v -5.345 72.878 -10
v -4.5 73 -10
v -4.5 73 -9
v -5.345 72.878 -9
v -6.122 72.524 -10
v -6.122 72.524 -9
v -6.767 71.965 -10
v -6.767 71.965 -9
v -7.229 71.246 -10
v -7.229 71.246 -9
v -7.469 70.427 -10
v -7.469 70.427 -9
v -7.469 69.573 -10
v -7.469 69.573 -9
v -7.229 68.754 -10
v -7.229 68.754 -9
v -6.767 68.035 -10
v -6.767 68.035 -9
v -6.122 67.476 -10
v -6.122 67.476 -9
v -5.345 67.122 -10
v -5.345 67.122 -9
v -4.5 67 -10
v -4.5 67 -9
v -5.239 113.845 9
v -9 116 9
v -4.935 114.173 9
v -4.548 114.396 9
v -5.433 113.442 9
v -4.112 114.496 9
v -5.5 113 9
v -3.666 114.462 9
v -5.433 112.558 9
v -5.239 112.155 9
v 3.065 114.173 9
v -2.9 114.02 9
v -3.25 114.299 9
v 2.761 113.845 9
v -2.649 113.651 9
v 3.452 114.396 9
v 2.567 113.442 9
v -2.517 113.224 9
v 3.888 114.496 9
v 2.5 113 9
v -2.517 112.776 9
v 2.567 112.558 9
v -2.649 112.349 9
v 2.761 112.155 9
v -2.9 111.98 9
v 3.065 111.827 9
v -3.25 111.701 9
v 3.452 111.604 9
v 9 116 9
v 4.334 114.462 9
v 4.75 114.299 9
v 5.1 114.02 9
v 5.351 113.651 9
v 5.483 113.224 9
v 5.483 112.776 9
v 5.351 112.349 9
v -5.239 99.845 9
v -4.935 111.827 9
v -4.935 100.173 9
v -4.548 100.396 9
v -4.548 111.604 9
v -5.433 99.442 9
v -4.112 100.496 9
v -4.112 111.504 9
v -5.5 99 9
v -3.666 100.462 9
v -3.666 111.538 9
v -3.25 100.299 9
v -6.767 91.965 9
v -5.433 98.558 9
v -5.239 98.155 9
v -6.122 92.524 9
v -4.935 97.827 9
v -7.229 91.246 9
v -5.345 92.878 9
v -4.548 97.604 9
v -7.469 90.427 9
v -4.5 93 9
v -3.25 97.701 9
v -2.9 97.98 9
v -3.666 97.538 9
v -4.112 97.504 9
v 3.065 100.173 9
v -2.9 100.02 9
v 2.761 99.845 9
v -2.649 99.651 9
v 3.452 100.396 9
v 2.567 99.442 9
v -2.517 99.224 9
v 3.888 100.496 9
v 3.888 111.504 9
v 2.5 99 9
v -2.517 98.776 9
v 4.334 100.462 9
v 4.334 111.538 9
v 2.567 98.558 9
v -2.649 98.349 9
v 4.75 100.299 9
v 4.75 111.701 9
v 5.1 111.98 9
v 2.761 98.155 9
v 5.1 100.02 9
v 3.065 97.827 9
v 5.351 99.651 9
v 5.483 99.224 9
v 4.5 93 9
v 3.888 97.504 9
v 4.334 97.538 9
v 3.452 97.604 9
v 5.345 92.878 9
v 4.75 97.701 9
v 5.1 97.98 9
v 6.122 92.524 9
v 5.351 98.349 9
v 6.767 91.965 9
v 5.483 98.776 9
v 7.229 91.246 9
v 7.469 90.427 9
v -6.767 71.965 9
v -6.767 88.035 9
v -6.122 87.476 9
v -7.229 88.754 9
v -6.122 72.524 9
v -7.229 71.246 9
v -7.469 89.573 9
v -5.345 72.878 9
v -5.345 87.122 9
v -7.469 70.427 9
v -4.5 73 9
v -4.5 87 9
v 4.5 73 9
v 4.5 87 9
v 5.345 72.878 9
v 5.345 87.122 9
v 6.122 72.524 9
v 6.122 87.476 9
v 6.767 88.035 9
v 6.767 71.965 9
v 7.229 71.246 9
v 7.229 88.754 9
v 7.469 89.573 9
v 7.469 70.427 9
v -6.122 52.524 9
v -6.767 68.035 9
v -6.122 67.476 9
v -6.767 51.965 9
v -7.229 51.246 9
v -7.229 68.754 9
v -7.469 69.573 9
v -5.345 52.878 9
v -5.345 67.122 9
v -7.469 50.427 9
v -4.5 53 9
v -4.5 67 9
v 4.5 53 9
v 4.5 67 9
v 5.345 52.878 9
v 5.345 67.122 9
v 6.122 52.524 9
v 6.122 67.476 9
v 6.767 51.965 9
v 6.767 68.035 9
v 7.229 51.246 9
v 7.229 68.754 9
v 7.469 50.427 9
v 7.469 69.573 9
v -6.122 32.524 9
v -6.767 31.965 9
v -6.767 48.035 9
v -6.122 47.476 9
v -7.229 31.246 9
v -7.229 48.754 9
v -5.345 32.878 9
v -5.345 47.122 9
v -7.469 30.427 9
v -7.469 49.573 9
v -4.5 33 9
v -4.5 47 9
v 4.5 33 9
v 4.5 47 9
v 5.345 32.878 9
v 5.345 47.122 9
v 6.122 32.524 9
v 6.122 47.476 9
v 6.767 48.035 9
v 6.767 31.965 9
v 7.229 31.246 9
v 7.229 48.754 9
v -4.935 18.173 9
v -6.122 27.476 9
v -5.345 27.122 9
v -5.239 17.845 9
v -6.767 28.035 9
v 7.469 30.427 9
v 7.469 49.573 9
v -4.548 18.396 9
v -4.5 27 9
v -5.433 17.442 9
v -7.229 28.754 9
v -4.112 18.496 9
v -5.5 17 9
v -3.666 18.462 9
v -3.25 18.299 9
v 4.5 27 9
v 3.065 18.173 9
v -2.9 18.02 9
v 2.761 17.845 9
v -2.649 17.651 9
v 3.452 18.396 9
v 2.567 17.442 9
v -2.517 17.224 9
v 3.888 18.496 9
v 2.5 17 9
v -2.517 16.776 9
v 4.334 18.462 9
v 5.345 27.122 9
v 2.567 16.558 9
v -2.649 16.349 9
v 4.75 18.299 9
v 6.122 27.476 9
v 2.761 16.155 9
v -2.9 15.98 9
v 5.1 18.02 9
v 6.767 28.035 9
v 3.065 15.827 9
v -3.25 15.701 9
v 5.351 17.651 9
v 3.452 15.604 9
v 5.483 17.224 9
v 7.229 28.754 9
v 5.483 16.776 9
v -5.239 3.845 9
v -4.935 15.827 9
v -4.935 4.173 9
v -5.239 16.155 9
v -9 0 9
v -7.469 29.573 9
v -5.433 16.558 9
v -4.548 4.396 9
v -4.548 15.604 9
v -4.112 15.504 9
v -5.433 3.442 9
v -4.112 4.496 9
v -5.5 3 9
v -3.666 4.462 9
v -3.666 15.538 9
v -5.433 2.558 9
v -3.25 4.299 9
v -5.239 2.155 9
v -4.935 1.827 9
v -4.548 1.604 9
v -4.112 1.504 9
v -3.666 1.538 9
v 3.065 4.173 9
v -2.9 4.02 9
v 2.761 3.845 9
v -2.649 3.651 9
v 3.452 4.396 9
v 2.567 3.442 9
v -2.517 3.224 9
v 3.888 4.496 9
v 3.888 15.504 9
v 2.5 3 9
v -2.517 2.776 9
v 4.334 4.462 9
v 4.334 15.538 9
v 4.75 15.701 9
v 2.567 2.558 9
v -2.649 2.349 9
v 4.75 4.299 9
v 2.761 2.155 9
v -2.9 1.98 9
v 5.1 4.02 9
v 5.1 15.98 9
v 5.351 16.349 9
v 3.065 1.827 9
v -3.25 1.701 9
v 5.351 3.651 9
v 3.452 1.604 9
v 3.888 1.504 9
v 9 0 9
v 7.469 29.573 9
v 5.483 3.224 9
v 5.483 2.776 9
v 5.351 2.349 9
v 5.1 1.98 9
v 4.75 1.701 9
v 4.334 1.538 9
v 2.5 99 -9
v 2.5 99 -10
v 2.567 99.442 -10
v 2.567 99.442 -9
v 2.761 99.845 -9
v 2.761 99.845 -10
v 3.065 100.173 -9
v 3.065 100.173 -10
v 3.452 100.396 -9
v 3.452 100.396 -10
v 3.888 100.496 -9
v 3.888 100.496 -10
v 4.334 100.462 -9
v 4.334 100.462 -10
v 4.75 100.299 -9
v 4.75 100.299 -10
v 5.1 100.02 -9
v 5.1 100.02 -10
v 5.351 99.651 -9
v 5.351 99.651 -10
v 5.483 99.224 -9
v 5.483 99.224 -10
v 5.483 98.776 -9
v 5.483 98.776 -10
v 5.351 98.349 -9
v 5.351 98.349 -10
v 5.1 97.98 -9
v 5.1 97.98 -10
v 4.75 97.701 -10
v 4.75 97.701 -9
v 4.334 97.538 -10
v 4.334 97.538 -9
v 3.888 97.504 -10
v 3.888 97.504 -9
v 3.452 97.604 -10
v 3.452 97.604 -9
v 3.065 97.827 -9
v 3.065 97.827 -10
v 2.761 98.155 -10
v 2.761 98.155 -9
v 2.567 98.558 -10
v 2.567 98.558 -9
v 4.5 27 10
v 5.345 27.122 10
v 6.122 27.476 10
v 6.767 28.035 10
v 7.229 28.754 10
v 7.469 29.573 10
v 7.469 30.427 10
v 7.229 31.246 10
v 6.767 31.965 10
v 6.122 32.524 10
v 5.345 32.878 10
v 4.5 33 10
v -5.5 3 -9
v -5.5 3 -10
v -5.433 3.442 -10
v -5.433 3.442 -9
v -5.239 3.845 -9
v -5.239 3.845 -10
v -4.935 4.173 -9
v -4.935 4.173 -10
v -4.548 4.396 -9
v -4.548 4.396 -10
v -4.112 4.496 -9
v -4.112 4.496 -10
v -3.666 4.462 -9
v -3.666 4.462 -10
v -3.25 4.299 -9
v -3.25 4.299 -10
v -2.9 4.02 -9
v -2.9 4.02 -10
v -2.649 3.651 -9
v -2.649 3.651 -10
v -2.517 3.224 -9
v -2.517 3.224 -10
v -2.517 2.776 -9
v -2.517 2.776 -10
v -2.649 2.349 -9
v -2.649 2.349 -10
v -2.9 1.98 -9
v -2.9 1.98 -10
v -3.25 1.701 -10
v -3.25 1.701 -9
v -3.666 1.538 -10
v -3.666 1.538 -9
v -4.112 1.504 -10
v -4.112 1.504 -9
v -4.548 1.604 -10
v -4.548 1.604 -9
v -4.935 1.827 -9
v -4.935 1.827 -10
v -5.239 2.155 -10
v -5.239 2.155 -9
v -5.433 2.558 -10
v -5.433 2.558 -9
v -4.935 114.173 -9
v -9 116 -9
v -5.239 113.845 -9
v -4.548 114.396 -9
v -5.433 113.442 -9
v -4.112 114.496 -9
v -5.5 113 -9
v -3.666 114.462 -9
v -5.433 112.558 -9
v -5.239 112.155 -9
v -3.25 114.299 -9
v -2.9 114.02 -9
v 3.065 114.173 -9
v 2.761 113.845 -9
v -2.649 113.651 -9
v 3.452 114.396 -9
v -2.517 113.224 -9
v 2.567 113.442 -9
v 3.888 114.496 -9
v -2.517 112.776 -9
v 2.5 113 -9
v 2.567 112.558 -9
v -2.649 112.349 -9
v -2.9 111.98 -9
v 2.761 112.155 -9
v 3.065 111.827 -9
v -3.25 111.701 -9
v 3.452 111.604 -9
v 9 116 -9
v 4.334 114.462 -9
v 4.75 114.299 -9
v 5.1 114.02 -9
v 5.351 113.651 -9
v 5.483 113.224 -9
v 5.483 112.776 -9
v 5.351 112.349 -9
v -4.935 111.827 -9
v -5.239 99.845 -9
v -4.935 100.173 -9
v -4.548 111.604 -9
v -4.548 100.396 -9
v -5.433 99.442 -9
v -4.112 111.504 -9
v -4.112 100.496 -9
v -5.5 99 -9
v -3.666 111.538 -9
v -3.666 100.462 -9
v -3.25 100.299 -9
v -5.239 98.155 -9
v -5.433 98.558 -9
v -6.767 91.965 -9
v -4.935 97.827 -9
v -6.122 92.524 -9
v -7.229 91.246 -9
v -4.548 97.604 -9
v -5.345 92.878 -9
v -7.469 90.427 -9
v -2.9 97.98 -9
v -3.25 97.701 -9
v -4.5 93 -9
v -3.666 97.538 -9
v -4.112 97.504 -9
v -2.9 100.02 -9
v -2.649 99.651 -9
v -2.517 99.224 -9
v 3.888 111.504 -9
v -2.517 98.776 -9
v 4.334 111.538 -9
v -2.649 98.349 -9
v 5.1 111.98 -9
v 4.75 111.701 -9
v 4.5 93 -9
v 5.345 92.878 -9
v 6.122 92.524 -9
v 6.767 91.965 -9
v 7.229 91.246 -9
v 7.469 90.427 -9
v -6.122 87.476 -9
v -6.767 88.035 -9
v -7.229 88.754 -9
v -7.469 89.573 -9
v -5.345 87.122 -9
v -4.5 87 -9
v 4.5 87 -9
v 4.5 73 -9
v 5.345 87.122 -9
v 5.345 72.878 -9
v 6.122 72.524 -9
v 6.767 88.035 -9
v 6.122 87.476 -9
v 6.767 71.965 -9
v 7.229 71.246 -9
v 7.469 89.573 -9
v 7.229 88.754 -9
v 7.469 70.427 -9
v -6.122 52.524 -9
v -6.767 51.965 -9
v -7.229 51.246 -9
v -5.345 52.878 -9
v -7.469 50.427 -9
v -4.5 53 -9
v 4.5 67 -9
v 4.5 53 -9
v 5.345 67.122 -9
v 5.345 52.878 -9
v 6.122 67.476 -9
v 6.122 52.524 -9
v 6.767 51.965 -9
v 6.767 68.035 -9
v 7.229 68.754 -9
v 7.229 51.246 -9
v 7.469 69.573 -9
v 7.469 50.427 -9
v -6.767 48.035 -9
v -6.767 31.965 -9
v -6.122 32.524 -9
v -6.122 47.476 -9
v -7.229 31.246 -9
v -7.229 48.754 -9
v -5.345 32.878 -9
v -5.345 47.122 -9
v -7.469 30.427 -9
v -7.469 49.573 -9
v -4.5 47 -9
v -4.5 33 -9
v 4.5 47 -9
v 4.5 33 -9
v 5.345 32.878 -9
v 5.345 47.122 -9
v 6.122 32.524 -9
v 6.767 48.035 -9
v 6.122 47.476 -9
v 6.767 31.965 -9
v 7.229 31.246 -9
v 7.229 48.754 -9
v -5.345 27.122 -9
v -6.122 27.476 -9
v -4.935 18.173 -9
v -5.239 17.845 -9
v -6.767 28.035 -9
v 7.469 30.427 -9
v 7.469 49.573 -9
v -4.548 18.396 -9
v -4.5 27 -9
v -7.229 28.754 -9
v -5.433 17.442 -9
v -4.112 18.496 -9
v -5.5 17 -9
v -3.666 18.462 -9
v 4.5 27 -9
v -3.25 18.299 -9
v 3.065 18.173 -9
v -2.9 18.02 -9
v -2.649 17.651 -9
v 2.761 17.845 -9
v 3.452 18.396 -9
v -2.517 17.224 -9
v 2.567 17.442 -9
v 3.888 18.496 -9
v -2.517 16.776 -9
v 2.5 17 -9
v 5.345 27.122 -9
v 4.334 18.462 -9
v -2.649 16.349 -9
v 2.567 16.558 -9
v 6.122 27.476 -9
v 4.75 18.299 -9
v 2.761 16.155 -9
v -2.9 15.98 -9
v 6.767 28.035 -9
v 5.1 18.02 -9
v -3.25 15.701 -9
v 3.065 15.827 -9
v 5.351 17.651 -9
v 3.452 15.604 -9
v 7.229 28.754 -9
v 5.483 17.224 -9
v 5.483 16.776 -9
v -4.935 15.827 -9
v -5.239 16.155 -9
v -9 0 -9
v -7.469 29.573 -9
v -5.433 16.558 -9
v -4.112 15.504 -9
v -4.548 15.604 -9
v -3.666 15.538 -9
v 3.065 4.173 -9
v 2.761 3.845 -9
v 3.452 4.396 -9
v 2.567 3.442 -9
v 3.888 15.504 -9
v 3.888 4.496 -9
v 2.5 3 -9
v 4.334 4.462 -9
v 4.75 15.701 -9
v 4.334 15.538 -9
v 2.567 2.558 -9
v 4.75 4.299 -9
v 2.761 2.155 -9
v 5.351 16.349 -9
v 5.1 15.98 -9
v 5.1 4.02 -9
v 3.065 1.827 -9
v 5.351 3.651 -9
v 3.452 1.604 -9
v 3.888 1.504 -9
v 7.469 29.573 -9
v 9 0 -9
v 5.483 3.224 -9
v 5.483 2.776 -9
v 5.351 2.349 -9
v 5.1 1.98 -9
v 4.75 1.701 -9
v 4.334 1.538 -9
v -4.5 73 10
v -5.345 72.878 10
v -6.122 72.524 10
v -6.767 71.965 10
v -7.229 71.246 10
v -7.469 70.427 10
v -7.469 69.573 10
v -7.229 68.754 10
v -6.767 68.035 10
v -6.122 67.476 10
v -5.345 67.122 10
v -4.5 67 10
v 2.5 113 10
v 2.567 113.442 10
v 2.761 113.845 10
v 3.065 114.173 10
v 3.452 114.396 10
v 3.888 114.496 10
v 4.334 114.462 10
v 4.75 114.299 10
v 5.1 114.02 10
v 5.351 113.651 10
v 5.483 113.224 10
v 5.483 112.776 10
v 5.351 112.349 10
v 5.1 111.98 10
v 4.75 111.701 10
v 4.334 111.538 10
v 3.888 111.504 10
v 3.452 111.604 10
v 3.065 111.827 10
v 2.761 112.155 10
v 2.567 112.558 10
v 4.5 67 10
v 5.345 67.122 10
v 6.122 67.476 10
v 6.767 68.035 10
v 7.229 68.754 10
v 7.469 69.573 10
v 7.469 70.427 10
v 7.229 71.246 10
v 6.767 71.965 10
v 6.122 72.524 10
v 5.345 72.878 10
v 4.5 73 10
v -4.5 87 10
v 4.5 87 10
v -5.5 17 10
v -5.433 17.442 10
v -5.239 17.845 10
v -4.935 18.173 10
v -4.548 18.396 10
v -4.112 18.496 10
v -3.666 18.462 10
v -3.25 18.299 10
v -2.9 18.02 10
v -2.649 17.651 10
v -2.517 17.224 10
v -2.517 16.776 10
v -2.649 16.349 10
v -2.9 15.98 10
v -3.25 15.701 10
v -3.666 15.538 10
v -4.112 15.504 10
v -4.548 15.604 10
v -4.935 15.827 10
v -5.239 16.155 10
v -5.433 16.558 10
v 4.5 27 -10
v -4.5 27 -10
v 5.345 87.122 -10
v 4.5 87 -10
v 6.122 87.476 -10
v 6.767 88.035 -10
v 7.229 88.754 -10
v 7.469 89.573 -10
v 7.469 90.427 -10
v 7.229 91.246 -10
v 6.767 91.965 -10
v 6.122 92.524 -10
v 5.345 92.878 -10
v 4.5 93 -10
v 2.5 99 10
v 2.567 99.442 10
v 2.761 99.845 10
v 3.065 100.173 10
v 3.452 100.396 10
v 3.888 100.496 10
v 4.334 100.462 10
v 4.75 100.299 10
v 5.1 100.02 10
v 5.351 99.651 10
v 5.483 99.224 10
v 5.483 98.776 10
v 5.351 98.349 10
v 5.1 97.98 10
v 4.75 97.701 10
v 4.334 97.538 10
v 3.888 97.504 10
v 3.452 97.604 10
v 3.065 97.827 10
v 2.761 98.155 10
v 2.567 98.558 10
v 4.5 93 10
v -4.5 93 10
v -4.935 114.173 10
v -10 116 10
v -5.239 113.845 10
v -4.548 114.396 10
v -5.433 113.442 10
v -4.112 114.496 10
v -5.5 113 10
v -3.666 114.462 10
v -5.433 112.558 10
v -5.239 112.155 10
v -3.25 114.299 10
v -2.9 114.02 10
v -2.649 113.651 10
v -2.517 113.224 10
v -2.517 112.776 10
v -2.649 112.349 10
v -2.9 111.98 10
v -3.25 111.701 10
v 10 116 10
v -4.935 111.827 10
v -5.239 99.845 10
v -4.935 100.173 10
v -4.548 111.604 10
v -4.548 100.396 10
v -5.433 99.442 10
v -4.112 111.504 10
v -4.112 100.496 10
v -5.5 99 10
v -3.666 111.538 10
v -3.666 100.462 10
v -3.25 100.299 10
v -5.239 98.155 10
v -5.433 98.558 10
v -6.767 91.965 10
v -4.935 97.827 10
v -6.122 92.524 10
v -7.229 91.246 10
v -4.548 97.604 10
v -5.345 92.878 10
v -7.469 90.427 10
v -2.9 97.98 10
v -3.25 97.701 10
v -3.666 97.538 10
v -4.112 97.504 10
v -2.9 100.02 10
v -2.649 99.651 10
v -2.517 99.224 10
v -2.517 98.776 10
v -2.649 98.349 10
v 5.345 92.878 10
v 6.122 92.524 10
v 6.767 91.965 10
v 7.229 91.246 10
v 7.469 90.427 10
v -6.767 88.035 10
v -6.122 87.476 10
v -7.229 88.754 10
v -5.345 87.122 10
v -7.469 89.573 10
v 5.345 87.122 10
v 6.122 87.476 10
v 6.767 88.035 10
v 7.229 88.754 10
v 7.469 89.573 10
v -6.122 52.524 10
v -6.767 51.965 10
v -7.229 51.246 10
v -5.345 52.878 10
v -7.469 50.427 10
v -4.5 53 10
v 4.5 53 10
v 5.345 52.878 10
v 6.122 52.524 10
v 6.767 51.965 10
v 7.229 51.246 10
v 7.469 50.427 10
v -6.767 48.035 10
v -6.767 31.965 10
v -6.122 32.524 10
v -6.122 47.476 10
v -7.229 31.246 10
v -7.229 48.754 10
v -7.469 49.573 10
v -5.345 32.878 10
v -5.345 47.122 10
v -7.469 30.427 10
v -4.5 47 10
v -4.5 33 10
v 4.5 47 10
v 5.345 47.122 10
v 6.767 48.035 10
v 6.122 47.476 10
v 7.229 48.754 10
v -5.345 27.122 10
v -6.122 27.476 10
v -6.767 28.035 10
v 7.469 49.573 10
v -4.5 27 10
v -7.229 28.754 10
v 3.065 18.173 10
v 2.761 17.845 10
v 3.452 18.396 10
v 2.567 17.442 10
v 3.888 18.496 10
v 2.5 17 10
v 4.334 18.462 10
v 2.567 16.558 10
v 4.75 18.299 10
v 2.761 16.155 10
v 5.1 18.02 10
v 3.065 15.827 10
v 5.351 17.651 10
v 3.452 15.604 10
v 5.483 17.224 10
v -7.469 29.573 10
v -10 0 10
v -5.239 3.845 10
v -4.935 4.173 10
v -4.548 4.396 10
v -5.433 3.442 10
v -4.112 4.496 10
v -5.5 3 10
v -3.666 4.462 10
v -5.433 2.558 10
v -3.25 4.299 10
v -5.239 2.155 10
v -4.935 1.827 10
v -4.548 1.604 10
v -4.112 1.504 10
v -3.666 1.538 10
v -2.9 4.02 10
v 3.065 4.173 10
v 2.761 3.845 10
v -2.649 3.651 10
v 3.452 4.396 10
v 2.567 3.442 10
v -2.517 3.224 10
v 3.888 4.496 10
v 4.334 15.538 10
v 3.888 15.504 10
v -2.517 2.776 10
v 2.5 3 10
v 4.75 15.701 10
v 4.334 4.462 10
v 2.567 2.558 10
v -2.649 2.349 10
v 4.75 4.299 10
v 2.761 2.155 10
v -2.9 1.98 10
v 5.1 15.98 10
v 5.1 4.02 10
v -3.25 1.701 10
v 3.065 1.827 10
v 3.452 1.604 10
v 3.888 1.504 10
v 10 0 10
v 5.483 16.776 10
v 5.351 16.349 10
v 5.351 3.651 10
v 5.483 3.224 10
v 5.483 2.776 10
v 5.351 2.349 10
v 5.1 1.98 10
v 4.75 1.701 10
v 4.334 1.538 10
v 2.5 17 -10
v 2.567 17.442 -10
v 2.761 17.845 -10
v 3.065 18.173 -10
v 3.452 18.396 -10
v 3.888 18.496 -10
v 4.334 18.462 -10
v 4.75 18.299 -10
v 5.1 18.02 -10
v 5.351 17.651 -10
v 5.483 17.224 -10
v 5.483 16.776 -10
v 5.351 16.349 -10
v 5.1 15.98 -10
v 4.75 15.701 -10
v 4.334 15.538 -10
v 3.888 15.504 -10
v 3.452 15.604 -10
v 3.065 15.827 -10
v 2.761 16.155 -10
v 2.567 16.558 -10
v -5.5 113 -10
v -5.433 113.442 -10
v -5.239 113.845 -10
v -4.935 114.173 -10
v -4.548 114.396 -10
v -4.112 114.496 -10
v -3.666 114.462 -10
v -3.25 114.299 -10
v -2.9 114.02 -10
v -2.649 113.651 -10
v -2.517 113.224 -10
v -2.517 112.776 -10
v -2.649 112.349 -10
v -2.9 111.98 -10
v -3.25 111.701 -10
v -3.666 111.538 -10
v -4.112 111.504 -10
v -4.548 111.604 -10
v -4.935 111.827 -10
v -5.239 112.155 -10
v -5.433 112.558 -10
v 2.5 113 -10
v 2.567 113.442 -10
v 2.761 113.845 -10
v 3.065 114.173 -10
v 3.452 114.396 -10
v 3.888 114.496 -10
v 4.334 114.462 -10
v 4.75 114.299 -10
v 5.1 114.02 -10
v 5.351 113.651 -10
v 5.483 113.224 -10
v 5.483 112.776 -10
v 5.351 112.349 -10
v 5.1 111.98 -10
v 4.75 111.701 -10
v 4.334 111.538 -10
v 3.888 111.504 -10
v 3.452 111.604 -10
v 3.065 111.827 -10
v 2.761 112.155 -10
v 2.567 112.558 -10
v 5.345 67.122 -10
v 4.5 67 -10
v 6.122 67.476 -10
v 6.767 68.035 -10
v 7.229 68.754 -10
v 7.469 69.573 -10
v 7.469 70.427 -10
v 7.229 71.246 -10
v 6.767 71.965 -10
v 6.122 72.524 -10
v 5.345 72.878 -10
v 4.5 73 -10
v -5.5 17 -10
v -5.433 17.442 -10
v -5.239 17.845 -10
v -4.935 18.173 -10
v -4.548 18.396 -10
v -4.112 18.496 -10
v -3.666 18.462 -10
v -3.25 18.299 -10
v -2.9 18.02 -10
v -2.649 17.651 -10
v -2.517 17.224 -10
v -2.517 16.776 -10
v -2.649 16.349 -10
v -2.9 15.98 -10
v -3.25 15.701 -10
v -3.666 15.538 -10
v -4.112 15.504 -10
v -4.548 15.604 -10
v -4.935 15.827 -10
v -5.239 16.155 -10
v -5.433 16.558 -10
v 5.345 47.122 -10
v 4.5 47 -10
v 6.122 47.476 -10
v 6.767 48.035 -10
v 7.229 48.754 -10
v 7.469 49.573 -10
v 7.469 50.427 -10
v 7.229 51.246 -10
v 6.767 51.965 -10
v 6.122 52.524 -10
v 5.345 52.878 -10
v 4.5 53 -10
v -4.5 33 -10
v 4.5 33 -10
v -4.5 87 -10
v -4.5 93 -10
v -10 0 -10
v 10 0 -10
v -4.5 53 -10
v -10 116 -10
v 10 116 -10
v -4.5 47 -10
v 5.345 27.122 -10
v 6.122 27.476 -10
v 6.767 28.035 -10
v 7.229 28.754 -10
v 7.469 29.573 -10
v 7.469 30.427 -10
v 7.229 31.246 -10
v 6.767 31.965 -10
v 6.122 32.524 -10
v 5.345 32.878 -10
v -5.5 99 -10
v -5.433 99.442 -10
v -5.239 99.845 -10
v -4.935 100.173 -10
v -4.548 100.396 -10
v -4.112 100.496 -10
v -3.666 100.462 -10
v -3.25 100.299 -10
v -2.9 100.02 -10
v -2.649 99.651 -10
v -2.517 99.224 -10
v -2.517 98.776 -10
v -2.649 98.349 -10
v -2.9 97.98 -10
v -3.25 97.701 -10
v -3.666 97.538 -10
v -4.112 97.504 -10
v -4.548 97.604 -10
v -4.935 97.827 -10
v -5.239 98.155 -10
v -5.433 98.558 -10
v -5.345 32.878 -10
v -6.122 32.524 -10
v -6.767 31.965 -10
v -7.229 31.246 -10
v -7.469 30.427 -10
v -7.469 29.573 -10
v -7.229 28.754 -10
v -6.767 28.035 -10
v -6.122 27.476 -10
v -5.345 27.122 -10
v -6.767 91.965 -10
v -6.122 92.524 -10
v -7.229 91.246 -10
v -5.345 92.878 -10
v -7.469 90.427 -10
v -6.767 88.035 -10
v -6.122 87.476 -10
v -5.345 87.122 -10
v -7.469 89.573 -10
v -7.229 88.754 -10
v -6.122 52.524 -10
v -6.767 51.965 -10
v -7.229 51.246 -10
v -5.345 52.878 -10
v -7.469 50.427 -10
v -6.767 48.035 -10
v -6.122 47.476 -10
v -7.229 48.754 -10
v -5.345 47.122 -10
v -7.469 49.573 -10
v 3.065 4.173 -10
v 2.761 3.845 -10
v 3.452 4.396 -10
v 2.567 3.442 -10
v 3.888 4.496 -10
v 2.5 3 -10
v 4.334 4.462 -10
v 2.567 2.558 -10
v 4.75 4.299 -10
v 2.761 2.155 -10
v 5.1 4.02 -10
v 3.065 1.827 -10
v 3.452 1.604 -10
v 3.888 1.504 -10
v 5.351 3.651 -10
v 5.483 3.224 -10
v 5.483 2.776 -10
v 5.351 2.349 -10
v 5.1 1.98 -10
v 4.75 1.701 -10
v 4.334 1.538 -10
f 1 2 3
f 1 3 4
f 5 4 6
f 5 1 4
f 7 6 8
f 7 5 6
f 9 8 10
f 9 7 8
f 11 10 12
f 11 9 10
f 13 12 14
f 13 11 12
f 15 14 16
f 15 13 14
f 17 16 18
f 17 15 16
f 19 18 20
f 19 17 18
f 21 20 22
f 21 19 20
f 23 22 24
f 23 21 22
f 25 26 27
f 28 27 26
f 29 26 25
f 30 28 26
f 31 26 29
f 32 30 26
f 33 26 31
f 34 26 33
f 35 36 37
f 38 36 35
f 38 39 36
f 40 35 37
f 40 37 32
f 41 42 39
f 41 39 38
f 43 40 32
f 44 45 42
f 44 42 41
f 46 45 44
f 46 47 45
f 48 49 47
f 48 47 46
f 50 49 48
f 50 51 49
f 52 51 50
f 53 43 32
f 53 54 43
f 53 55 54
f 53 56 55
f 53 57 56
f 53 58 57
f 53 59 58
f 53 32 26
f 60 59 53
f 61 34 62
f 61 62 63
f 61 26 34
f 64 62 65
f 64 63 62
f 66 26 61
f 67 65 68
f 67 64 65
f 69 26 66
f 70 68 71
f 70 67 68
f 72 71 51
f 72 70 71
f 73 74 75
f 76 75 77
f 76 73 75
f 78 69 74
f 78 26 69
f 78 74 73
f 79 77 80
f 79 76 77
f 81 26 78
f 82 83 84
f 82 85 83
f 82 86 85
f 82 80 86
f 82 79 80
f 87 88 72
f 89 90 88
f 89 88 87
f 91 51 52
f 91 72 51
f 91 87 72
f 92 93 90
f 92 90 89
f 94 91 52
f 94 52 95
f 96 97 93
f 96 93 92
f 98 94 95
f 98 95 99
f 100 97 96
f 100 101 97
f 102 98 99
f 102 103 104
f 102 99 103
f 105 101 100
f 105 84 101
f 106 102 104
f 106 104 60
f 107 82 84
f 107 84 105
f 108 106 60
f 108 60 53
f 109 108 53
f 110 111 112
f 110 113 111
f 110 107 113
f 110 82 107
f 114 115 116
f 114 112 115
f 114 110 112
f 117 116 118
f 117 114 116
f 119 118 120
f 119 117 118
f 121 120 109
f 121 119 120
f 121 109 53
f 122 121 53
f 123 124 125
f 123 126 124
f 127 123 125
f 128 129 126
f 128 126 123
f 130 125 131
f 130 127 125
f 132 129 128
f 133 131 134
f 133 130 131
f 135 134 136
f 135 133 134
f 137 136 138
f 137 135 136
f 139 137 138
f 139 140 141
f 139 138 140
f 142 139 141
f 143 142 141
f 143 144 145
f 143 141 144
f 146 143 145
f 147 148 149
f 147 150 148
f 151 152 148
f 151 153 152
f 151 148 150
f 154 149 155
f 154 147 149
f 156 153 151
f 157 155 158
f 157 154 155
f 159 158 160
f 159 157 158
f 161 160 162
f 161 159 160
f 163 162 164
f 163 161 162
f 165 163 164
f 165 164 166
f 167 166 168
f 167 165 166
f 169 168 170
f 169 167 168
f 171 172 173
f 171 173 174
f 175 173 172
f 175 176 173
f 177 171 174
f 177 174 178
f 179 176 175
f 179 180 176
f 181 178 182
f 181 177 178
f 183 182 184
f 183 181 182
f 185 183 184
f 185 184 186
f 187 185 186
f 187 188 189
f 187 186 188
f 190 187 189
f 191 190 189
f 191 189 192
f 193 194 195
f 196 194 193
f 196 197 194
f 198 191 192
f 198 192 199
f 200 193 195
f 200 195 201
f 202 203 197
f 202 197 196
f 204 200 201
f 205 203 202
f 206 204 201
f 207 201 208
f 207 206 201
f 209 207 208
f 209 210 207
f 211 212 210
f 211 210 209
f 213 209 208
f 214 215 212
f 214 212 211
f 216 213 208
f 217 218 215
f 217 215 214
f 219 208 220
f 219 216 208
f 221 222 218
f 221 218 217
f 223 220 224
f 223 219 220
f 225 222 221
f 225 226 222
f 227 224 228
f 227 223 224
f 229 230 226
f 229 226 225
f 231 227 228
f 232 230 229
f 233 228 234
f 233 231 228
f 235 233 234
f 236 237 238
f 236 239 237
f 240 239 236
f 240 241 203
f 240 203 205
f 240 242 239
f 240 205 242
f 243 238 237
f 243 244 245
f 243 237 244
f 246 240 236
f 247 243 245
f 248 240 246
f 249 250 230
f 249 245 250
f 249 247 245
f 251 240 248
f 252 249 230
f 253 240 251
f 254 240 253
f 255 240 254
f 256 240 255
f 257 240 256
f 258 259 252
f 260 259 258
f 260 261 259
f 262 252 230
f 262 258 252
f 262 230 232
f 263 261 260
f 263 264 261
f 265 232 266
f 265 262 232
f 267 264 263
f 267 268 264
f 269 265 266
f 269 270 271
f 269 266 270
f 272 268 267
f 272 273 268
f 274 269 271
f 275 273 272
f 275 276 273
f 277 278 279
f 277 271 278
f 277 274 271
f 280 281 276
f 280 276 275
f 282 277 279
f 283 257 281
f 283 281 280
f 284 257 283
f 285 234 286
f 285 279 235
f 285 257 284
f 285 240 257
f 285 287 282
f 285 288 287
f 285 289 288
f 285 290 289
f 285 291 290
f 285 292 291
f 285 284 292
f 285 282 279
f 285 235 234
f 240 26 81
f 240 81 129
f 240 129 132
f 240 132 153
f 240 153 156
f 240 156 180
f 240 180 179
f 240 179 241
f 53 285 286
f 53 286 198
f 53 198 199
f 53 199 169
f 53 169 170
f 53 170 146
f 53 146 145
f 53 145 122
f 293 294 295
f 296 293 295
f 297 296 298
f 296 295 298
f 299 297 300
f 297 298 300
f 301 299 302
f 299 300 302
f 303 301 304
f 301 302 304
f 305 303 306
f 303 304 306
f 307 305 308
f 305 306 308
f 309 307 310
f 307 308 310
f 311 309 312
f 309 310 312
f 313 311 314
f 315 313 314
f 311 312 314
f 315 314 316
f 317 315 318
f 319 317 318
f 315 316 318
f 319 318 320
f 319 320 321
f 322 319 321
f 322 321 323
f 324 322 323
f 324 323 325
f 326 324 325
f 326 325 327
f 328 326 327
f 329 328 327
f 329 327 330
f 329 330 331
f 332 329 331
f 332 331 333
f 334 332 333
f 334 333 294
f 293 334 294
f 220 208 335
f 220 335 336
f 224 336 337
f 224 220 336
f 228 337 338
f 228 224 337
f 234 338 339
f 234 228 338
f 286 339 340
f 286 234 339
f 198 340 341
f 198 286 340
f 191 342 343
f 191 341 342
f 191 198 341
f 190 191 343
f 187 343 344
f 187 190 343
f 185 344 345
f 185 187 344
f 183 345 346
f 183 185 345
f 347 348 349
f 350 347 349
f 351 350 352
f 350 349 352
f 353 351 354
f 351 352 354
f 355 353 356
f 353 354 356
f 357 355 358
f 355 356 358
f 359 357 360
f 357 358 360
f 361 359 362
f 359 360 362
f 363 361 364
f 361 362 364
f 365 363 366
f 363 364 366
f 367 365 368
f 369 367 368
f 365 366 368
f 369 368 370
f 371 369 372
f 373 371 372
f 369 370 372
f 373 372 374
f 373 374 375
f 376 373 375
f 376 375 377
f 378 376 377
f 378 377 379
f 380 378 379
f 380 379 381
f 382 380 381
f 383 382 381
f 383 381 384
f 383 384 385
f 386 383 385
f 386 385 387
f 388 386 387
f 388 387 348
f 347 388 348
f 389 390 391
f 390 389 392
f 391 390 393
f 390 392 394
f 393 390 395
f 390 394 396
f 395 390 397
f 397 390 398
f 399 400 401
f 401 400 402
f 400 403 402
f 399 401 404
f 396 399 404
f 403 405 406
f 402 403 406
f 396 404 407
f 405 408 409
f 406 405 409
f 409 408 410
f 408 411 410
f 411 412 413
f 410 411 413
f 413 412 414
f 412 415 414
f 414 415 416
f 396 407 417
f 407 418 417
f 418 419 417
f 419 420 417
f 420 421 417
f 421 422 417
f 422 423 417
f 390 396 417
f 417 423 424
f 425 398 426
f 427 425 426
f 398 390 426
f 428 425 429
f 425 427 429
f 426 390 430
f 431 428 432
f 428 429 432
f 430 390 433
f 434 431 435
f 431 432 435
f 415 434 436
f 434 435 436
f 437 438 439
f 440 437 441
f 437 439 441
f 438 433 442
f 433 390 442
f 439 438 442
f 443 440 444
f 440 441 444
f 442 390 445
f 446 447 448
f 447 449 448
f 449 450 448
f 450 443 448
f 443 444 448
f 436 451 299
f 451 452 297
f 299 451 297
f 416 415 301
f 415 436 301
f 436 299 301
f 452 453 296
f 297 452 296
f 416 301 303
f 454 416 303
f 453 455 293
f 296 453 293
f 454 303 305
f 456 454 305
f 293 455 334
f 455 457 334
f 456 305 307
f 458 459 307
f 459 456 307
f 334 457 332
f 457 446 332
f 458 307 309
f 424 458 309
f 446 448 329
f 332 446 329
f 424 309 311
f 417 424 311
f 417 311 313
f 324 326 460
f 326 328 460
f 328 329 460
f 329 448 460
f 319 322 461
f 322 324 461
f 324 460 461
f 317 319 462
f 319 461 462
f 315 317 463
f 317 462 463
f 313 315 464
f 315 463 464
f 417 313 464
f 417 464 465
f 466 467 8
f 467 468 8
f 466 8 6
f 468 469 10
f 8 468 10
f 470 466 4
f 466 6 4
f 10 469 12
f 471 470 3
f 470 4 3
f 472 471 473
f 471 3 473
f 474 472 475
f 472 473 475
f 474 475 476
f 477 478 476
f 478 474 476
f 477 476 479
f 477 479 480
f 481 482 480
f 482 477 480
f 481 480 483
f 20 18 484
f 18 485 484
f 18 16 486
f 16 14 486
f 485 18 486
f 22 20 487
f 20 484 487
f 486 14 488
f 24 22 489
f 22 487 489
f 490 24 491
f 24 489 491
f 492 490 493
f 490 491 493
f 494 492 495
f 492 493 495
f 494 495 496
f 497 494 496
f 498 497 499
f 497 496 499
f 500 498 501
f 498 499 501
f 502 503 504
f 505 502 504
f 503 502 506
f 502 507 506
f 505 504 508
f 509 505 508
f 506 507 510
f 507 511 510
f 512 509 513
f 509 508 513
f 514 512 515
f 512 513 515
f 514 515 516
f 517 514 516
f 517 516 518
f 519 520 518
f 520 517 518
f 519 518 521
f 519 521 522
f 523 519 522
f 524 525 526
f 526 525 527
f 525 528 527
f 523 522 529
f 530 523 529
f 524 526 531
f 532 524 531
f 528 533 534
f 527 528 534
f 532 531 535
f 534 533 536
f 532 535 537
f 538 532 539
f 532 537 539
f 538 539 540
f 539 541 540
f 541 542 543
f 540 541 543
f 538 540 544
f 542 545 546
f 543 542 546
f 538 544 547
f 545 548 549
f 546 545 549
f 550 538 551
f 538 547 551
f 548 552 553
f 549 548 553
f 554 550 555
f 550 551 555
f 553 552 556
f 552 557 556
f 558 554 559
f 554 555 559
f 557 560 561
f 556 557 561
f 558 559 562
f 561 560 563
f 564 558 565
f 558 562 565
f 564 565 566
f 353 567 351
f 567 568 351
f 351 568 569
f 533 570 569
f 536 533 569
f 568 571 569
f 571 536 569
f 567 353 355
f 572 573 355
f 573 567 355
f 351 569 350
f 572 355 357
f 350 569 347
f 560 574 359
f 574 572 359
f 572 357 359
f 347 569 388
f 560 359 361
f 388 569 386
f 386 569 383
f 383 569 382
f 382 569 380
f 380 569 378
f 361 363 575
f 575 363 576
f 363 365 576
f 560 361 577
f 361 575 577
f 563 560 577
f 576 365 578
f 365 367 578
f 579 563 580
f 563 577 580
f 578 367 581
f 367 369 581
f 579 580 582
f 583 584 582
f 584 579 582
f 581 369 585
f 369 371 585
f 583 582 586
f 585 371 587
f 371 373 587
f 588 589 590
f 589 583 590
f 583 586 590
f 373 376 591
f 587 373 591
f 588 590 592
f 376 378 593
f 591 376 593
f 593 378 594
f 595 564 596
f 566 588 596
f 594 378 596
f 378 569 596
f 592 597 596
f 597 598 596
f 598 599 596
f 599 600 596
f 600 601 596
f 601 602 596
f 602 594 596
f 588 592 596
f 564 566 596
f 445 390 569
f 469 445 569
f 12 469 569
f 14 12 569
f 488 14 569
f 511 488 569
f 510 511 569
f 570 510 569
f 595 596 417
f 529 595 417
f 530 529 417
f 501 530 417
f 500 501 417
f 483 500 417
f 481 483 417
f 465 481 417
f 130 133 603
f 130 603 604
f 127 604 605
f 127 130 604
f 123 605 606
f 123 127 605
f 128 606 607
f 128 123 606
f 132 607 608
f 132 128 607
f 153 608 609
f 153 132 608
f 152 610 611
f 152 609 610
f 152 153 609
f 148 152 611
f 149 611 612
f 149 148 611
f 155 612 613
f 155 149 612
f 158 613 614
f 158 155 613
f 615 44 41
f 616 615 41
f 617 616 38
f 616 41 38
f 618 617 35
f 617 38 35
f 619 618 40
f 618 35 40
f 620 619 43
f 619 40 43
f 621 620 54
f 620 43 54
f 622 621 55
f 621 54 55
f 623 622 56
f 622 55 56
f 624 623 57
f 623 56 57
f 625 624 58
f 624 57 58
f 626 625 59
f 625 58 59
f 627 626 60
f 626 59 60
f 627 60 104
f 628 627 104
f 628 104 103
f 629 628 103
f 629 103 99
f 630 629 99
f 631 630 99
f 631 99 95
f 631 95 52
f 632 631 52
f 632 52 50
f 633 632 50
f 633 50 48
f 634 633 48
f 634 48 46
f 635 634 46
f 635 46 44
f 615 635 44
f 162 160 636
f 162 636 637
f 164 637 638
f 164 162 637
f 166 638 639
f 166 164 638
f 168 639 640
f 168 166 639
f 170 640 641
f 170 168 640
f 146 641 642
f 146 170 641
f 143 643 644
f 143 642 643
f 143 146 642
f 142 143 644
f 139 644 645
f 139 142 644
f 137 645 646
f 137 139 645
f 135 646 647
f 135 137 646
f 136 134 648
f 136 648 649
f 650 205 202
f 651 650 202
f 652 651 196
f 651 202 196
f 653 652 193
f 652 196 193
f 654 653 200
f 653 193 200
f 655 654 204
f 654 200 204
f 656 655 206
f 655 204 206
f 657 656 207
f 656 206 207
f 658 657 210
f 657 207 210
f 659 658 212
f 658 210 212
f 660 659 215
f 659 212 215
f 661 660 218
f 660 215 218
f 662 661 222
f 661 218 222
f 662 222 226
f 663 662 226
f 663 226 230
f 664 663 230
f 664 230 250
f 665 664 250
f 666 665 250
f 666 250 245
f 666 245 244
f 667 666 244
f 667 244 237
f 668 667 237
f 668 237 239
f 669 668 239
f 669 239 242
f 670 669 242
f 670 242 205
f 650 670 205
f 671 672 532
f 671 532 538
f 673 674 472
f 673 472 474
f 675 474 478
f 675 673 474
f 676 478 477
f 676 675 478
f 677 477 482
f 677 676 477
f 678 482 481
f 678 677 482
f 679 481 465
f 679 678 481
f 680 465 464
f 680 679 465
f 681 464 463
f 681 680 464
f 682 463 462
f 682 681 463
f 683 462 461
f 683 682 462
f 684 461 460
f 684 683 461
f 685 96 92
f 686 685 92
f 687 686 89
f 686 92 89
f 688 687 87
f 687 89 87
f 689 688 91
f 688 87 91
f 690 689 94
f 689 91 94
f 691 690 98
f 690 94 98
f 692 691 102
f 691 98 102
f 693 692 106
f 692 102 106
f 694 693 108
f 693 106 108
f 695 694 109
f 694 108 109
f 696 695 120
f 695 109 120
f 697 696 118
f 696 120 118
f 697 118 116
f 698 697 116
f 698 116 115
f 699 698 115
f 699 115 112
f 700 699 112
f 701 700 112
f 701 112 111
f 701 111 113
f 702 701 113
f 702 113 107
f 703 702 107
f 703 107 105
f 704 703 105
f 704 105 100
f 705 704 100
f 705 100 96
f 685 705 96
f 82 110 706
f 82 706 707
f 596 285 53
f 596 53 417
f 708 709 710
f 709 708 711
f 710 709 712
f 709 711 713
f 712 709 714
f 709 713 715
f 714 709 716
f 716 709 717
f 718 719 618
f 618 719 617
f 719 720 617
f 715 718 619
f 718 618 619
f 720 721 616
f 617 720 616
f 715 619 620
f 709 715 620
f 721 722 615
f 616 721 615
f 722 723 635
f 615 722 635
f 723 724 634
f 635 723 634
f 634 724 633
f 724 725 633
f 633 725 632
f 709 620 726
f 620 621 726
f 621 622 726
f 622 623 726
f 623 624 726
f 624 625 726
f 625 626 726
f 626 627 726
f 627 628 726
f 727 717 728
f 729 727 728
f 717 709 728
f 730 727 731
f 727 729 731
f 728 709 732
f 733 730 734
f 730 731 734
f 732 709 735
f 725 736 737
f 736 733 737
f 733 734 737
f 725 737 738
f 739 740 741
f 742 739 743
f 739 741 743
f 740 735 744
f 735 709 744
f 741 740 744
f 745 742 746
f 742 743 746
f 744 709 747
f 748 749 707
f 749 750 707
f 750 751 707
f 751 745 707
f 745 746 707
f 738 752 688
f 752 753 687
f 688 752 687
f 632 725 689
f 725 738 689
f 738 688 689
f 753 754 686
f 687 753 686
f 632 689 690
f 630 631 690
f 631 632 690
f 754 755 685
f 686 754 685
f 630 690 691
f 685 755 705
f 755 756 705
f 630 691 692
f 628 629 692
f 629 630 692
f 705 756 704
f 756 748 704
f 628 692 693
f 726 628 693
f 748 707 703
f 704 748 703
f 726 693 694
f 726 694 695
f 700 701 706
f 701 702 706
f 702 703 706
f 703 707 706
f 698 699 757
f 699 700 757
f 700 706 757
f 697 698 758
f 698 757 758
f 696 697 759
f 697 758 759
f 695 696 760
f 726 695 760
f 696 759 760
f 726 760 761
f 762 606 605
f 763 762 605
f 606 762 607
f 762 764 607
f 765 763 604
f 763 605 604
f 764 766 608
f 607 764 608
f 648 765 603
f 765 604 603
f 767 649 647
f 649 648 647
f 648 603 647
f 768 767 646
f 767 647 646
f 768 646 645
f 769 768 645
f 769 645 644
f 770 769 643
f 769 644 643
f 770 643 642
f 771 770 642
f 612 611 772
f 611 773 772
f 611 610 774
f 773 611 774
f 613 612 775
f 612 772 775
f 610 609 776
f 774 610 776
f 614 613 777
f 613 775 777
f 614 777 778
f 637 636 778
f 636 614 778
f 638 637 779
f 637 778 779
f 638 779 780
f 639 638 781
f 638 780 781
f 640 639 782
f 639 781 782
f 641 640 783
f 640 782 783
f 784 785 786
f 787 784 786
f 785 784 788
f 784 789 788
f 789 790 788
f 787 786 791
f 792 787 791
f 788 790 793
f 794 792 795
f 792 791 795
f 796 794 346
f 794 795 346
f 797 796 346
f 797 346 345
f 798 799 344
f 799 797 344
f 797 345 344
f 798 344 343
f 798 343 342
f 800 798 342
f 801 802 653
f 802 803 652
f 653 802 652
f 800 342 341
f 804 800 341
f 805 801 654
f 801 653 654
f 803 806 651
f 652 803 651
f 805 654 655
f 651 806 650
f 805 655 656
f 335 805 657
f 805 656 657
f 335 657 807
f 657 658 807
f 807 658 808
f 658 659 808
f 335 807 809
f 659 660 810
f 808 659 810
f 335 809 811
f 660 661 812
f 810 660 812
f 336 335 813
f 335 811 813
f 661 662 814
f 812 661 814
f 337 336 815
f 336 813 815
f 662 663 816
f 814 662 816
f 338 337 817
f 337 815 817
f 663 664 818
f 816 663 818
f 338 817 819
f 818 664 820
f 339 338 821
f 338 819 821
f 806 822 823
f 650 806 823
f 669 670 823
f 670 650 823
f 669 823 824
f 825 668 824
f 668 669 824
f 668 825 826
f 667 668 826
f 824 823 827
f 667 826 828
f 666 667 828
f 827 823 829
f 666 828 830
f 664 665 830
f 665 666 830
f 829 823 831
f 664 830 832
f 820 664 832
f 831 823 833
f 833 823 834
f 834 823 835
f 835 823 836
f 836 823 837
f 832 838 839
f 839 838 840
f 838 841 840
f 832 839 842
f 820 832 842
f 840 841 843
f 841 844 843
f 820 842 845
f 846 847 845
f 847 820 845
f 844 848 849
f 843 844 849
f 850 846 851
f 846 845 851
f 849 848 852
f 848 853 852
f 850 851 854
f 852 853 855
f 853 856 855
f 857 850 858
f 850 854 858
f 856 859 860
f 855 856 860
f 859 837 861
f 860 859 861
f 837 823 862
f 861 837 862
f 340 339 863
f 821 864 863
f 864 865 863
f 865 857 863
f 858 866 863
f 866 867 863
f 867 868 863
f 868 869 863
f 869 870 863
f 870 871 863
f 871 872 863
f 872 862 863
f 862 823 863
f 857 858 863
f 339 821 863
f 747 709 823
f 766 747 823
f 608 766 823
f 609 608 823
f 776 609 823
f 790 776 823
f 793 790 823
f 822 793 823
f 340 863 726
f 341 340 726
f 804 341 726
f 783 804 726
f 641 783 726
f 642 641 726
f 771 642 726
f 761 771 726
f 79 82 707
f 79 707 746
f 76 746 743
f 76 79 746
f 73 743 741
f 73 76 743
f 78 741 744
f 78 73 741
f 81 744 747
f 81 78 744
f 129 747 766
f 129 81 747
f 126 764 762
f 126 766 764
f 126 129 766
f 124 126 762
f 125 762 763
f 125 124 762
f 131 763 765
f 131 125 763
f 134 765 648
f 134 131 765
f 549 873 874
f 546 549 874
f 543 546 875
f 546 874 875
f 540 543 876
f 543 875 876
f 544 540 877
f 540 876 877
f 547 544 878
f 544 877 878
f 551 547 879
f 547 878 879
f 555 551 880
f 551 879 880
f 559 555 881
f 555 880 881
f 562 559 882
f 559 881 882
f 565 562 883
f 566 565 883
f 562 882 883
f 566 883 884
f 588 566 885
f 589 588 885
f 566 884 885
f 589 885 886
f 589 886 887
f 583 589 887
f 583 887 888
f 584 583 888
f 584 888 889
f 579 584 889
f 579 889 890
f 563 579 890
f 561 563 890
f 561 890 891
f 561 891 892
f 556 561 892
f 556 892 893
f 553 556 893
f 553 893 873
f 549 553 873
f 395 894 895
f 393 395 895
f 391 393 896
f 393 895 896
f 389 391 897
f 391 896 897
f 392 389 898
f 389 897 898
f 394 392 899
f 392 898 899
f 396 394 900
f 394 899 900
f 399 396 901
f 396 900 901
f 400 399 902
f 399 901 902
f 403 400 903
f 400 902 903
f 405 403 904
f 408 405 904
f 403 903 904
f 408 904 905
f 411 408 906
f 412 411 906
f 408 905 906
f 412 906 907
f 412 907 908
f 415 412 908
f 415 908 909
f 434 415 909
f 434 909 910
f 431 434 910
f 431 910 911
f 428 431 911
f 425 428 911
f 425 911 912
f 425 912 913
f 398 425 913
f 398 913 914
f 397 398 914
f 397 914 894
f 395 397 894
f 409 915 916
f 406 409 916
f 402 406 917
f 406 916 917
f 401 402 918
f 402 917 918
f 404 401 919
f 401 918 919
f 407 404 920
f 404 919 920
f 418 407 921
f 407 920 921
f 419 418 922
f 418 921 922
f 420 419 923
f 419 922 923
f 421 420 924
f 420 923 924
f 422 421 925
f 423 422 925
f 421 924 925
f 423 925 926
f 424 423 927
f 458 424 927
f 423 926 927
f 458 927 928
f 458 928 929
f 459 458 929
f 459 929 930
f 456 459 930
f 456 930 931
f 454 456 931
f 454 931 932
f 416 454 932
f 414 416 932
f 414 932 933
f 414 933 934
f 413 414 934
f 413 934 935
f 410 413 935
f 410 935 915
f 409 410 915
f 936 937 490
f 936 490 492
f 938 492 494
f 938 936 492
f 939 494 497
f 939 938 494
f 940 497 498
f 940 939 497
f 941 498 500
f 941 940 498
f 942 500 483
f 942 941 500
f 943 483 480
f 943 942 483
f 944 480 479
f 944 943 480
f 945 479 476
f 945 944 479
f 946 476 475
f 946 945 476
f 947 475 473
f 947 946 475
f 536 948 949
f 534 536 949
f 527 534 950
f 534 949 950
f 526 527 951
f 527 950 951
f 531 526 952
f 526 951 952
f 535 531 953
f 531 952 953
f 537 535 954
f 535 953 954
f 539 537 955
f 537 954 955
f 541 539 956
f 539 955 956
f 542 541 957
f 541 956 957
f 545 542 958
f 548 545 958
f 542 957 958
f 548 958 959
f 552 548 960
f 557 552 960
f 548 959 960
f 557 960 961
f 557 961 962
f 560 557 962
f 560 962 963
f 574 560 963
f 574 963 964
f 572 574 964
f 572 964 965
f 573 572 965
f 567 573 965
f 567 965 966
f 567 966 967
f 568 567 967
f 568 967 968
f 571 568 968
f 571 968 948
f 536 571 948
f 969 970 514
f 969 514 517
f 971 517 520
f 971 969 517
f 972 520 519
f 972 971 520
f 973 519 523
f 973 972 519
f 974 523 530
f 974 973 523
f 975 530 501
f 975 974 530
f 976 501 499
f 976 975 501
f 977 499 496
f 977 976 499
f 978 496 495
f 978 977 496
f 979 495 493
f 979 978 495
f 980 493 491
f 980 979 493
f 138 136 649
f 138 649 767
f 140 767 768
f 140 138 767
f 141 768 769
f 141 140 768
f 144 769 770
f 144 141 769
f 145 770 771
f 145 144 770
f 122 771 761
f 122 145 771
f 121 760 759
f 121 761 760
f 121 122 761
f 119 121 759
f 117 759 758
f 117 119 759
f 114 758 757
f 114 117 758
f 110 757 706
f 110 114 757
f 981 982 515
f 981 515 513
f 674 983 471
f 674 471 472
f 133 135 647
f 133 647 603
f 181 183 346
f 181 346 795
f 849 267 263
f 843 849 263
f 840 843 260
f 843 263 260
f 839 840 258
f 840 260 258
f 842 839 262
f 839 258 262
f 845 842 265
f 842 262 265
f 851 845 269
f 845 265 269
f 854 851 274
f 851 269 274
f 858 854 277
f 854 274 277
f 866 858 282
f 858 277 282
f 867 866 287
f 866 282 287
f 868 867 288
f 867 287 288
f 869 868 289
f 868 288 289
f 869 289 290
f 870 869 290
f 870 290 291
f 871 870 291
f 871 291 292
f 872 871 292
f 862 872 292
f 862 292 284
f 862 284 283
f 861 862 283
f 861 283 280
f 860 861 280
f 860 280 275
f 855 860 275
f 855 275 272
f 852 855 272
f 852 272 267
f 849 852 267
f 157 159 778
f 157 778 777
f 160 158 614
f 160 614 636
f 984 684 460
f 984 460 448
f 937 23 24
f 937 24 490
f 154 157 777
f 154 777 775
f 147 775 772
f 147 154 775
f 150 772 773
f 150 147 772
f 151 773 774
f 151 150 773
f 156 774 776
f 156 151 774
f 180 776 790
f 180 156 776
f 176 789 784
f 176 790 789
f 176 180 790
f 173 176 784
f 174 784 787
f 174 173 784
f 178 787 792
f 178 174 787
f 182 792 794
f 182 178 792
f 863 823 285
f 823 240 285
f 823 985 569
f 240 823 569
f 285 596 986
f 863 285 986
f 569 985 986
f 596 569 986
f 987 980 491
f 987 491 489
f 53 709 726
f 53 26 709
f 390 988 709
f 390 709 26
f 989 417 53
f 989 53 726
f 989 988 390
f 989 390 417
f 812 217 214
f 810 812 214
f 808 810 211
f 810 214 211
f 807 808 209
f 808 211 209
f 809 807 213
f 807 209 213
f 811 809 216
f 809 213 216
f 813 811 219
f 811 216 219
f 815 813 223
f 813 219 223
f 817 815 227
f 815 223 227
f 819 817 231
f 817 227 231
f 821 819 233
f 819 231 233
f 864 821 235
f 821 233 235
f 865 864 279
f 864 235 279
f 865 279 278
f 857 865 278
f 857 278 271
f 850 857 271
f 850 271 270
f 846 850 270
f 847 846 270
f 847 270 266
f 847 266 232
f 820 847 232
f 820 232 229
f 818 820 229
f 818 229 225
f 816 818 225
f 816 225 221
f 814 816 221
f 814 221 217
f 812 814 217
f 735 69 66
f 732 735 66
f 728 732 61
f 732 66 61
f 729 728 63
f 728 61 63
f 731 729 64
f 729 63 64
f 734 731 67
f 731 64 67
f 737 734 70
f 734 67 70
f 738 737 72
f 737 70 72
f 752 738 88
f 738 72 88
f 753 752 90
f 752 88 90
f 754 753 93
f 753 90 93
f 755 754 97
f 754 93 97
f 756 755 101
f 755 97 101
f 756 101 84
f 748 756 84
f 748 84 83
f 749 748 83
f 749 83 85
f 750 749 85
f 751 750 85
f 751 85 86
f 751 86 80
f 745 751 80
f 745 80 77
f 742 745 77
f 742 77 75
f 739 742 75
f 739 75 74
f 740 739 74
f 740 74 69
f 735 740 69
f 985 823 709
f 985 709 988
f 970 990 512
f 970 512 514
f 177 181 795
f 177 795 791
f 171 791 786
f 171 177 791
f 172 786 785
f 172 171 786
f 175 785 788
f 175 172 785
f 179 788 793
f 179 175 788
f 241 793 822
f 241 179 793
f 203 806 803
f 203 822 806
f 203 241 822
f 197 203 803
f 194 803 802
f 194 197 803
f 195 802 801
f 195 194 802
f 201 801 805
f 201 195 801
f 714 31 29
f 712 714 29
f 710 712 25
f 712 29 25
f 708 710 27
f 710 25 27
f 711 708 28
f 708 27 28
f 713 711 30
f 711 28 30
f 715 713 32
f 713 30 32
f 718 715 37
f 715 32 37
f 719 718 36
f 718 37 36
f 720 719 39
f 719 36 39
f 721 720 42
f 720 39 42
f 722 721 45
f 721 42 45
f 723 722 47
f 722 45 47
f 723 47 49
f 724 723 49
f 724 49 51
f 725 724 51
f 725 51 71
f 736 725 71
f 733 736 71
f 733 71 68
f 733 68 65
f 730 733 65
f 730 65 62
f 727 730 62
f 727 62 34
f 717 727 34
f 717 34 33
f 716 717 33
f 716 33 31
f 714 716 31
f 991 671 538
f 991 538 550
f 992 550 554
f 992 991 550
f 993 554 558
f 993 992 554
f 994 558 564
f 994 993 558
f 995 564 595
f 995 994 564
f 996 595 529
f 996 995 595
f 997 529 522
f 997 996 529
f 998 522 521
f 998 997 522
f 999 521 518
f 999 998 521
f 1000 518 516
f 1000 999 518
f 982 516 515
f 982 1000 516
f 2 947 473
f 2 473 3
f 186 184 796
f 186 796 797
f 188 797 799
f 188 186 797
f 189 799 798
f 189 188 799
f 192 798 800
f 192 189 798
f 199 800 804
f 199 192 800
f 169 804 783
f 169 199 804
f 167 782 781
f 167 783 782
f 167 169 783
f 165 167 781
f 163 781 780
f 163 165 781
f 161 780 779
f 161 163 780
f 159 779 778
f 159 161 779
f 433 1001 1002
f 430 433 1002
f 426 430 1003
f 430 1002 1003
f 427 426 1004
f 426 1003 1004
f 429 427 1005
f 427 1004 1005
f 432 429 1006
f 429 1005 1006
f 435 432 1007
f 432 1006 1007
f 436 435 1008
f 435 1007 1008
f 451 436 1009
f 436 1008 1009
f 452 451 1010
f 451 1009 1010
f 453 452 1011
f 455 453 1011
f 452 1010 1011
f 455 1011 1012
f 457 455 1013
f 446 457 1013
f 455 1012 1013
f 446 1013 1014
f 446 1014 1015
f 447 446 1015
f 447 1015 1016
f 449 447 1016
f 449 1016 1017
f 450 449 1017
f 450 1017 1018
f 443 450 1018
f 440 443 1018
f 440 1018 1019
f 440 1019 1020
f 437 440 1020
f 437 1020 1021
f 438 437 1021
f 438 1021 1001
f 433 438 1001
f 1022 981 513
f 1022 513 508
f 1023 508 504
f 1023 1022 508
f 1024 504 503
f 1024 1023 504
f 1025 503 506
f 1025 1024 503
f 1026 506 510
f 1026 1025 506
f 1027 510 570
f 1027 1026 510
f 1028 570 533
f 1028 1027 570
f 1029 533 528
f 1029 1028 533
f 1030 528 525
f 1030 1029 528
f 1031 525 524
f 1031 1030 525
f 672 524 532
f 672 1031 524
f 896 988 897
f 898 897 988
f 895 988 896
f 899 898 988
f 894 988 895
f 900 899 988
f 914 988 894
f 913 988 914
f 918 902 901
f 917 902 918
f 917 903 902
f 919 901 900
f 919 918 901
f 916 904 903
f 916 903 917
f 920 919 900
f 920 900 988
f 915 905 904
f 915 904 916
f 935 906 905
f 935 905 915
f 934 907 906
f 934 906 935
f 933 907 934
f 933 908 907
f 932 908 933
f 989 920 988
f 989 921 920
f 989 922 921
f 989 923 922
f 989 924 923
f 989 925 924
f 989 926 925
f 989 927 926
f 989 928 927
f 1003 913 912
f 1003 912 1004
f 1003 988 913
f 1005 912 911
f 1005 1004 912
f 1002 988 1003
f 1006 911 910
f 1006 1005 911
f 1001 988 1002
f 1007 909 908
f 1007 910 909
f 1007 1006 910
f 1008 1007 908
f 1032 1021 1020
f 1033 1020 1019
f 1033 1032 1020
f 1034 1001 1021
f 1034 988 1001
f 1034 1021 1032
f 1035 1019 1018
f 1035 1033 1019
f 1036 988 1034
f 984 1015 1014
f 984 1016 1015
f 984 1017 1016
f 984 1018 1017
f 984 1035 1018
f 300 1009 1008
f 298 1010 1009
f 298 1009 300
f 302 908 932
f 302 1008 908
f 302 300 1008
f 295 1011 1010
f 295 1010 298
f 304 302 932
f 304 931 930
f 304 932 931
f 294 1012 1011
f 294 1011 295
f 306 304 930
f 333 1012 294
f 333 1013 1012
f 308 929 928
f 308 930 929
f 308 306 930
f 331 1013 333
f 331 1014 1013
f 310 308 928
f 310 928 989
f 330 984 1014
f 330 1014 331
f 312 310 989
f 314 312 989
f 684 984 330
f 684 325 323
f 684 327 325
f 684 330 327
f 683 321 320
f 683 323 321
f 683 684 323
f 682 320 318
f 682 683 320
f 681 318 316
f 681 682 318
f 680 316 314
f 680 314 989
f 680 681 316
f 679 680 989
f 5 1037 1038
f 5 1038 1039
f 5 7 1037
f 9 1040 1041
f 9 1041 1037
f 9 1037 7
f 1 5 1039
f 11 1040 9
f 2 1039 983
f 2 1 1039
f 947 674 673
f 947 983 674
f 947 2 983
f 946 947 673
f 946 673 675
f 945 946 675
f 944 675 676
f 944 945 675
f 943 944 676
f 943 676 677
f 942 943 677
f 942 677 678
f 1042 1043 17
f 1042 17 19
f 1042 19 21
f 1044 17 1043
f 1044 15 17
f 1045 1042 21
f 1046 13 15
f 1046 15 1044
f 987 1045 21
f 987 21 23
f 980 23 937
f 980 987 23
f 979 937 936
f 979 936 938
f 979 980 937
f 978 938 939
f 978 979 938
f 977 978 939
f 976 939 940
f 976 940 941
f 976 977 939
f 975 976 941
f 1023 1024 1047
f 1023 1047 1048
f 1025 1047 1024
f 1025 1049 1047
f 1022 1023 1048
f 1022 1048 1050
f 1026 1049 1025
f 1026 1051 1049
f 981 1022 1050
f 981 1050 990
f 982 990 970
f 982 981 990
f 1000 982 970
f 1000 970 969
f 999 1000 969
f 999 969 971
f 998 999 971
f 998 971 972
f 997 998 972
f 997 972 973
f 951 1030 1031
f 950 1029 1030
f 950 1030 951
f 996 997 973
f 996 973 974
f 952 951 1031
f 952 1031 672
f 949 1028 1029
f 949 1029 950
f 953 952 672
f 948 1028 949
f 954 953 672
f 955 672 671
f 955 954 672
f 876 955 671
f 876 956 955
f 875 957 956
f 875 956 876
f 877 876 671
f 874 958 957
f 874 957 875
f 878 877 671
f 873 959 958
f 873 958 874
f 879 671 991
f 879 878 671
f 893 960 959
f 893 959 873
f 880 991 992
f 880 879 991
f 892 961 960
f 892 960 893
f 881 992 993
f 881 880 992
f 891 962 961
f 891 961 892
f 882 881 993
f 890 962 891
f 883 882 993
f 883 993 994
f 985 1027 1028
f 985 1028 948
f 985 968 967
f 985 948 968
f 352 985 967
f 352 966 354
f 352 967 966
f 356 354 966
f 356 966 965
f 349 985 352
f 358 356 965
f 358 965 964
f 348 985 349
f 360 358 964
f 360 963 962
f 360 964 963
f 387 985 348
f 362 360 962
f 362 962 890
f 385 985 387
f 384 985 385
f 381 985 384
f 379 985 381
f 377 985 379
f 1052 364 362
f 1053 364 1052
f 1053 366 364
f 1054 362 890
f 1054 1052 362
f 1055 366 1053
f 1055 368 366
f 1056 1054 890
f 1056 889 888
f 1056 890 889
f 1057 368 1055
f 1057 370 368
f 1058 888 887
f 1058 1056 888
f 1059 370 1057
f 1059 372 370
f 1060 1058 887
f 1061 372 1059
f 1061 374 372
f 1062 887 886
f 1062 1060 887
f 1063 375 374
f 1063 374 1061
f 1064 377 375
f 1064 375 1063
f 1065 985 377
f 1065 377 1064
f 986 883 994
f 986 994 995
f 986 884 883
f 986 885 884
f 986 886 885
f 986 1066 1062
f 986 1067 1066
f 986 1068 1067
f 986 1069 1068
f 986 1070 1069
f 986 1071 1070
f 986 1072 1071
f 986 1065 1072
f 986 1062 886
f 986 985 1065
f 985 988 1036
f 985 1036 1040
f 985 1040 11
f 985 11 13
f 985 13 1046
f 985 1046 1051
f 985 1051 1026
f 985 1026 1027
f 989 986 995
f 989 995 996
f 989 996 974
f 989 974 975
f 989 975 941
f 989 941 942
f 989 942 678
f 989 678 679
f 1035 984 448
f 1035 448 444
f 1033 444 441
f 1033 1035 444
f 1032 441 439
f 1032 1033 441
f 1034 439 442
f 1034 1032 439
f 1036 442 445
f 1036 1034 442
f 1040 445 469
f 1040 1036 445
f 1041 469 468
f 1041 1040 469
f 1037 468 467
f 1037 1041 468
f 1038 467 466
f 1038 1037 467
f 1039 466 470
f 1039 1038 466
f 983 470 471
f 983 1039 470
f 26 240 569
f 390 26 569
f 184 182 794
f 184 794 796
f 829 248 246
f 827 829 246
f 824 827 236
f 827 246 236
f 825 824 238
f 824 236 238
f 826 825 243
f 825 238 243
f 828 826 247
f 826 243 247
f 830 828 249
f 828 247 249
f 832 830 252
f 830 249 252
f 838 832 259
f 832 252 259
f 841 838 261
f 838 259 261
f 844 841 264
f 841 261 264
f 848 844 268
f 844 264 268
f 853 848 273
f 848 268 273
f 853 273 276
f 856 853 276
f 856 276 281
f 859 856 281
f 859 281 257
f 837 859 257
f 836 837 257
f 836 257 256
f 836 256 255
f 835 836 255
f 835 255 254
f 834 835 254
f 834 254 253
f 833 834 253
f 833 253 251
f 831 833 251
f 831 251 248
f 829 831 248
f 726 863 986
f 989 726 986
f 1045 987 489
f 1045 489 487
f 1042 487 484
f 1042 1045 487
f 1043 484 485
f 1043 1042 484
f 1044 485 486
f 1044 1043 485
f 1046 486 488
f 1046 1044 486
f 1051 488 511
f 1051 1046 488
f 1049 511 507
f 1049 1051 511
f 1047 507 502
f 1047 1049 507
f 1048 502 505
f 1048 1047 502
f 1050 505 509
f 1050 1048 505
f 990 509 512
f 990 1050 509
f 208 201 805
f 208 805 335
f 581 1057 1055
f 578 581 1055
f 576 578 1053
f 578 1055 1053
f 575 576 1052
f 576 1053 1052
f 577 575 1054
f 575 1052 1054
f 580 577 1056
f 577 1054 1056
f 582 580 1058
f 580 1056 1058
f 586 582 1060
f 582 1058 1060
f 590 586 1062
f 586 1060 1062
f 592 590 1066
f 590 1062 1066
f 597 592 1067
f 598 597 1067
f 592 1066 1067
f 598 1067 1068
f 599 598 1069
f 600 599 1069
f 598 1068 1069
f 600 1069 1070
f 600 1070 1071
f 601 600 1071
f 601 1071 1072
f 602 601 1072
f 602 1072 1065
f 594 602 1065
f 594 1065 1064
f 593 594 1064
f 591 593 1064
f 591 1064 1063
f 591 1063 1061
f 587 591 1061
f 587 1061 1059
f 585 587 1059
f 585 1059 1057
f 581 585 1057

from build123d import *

# Parameters (mm, degrees)
SKETCH_1_W             = 20
SKETCH_1_H             = 20
SKETCH_1_W_2           = 18
SKETCH_1_H_2           = 18
HS_20X20X1_1_DEPTH     = 116
CUT_EXTRUDE_4_DEPTH    = 37
PATTERN_LINEAR_1_COUNT = 4
PATTERN_LINEAR_1_PITCH = 20
SKETCH_5_R             = 1.5
CUT_EXTRUDE_5_DEPTH    = 31


with BuildPart() as part:
    # 草图1 → Hs 20X20X1(1) (new body)
    with BuildSketch(Plane(origin=(0, 0, 0), x_dir=(1, 0, 0), z_dir=(0, 1, 0))):
        Rectangle(SKETCH_1_W, SKETCH_1_H)
        Rectangle(SKETCH_1_W_2, SKETCH_1_H_2, mode=Mode.SUBTRACT)
    extrude(amount=HS_20X20X1_1_DEPTH)

    # 草图4 → 切除-拉伸4 (cut)
    with BuildSketch(Plane(origin=(0, 0, -10), x_dir=(-1, 0, 0), z_dir=(0, 0, -1))):
        with BuildLine():
            Line((-4.5, 33), (4.5, 33))
            ThreePointArc((4.5, 33), (7.5, 30), (4.5, 27))
            Line((4.5, 27), (-4.5, 27))
            ThreePointArc((-4.5, 27), (-7.5, 30), (-4.5, 33))
        make_face()
    cut_extrude_4 = extrude(amount=-CUT_EXTRUDE_4_DEPTH, mode=Mode.SUBTRACT)

    # 阵列(线性)1: 切除-拉伸4 ×4
    with Locations(*[(0, i * PATTERN_LINEAR_1_PITCH, 0) for i in range(1, PATTERN_LINEAR_1_COUNT)]):
        add(cut_extrude_4, mode=Mode.SUBTRACT)

    # 草图5 → 切除-拉伸5 (cut)
    with BuildSketch(Plane(origin=(0, 0, -10), x_dir=(-1, 0, 0), z_dir=(0, 0, -1))):
        with Locations((-4, 3)):
            Circle(SKETCH_5_R)
        with Locations((4, 3)):
            Circle(SKETCH_5_R)
        with Locations((4, 17)):
            Circle(SKETCH_5_R)
        with Locations((-4, 17)):
            Circle(SKETCH_5_R)
        with Locations((-4, 113)):
            Circle(SKETCH_5_R)
        with Locations((4, 113)):
            Circle(SKETCH_5_R)
        with Locations((-4, 99)):
            Circle(SKETCH_5_R)
        with Locations((4, 99)):
            Circle(SKETCH_5_R)
    extrude(amount=-CUT_EXTRUDE_5_DEPTH, mode=Mode.SUBTRACT)


solid = part.part
